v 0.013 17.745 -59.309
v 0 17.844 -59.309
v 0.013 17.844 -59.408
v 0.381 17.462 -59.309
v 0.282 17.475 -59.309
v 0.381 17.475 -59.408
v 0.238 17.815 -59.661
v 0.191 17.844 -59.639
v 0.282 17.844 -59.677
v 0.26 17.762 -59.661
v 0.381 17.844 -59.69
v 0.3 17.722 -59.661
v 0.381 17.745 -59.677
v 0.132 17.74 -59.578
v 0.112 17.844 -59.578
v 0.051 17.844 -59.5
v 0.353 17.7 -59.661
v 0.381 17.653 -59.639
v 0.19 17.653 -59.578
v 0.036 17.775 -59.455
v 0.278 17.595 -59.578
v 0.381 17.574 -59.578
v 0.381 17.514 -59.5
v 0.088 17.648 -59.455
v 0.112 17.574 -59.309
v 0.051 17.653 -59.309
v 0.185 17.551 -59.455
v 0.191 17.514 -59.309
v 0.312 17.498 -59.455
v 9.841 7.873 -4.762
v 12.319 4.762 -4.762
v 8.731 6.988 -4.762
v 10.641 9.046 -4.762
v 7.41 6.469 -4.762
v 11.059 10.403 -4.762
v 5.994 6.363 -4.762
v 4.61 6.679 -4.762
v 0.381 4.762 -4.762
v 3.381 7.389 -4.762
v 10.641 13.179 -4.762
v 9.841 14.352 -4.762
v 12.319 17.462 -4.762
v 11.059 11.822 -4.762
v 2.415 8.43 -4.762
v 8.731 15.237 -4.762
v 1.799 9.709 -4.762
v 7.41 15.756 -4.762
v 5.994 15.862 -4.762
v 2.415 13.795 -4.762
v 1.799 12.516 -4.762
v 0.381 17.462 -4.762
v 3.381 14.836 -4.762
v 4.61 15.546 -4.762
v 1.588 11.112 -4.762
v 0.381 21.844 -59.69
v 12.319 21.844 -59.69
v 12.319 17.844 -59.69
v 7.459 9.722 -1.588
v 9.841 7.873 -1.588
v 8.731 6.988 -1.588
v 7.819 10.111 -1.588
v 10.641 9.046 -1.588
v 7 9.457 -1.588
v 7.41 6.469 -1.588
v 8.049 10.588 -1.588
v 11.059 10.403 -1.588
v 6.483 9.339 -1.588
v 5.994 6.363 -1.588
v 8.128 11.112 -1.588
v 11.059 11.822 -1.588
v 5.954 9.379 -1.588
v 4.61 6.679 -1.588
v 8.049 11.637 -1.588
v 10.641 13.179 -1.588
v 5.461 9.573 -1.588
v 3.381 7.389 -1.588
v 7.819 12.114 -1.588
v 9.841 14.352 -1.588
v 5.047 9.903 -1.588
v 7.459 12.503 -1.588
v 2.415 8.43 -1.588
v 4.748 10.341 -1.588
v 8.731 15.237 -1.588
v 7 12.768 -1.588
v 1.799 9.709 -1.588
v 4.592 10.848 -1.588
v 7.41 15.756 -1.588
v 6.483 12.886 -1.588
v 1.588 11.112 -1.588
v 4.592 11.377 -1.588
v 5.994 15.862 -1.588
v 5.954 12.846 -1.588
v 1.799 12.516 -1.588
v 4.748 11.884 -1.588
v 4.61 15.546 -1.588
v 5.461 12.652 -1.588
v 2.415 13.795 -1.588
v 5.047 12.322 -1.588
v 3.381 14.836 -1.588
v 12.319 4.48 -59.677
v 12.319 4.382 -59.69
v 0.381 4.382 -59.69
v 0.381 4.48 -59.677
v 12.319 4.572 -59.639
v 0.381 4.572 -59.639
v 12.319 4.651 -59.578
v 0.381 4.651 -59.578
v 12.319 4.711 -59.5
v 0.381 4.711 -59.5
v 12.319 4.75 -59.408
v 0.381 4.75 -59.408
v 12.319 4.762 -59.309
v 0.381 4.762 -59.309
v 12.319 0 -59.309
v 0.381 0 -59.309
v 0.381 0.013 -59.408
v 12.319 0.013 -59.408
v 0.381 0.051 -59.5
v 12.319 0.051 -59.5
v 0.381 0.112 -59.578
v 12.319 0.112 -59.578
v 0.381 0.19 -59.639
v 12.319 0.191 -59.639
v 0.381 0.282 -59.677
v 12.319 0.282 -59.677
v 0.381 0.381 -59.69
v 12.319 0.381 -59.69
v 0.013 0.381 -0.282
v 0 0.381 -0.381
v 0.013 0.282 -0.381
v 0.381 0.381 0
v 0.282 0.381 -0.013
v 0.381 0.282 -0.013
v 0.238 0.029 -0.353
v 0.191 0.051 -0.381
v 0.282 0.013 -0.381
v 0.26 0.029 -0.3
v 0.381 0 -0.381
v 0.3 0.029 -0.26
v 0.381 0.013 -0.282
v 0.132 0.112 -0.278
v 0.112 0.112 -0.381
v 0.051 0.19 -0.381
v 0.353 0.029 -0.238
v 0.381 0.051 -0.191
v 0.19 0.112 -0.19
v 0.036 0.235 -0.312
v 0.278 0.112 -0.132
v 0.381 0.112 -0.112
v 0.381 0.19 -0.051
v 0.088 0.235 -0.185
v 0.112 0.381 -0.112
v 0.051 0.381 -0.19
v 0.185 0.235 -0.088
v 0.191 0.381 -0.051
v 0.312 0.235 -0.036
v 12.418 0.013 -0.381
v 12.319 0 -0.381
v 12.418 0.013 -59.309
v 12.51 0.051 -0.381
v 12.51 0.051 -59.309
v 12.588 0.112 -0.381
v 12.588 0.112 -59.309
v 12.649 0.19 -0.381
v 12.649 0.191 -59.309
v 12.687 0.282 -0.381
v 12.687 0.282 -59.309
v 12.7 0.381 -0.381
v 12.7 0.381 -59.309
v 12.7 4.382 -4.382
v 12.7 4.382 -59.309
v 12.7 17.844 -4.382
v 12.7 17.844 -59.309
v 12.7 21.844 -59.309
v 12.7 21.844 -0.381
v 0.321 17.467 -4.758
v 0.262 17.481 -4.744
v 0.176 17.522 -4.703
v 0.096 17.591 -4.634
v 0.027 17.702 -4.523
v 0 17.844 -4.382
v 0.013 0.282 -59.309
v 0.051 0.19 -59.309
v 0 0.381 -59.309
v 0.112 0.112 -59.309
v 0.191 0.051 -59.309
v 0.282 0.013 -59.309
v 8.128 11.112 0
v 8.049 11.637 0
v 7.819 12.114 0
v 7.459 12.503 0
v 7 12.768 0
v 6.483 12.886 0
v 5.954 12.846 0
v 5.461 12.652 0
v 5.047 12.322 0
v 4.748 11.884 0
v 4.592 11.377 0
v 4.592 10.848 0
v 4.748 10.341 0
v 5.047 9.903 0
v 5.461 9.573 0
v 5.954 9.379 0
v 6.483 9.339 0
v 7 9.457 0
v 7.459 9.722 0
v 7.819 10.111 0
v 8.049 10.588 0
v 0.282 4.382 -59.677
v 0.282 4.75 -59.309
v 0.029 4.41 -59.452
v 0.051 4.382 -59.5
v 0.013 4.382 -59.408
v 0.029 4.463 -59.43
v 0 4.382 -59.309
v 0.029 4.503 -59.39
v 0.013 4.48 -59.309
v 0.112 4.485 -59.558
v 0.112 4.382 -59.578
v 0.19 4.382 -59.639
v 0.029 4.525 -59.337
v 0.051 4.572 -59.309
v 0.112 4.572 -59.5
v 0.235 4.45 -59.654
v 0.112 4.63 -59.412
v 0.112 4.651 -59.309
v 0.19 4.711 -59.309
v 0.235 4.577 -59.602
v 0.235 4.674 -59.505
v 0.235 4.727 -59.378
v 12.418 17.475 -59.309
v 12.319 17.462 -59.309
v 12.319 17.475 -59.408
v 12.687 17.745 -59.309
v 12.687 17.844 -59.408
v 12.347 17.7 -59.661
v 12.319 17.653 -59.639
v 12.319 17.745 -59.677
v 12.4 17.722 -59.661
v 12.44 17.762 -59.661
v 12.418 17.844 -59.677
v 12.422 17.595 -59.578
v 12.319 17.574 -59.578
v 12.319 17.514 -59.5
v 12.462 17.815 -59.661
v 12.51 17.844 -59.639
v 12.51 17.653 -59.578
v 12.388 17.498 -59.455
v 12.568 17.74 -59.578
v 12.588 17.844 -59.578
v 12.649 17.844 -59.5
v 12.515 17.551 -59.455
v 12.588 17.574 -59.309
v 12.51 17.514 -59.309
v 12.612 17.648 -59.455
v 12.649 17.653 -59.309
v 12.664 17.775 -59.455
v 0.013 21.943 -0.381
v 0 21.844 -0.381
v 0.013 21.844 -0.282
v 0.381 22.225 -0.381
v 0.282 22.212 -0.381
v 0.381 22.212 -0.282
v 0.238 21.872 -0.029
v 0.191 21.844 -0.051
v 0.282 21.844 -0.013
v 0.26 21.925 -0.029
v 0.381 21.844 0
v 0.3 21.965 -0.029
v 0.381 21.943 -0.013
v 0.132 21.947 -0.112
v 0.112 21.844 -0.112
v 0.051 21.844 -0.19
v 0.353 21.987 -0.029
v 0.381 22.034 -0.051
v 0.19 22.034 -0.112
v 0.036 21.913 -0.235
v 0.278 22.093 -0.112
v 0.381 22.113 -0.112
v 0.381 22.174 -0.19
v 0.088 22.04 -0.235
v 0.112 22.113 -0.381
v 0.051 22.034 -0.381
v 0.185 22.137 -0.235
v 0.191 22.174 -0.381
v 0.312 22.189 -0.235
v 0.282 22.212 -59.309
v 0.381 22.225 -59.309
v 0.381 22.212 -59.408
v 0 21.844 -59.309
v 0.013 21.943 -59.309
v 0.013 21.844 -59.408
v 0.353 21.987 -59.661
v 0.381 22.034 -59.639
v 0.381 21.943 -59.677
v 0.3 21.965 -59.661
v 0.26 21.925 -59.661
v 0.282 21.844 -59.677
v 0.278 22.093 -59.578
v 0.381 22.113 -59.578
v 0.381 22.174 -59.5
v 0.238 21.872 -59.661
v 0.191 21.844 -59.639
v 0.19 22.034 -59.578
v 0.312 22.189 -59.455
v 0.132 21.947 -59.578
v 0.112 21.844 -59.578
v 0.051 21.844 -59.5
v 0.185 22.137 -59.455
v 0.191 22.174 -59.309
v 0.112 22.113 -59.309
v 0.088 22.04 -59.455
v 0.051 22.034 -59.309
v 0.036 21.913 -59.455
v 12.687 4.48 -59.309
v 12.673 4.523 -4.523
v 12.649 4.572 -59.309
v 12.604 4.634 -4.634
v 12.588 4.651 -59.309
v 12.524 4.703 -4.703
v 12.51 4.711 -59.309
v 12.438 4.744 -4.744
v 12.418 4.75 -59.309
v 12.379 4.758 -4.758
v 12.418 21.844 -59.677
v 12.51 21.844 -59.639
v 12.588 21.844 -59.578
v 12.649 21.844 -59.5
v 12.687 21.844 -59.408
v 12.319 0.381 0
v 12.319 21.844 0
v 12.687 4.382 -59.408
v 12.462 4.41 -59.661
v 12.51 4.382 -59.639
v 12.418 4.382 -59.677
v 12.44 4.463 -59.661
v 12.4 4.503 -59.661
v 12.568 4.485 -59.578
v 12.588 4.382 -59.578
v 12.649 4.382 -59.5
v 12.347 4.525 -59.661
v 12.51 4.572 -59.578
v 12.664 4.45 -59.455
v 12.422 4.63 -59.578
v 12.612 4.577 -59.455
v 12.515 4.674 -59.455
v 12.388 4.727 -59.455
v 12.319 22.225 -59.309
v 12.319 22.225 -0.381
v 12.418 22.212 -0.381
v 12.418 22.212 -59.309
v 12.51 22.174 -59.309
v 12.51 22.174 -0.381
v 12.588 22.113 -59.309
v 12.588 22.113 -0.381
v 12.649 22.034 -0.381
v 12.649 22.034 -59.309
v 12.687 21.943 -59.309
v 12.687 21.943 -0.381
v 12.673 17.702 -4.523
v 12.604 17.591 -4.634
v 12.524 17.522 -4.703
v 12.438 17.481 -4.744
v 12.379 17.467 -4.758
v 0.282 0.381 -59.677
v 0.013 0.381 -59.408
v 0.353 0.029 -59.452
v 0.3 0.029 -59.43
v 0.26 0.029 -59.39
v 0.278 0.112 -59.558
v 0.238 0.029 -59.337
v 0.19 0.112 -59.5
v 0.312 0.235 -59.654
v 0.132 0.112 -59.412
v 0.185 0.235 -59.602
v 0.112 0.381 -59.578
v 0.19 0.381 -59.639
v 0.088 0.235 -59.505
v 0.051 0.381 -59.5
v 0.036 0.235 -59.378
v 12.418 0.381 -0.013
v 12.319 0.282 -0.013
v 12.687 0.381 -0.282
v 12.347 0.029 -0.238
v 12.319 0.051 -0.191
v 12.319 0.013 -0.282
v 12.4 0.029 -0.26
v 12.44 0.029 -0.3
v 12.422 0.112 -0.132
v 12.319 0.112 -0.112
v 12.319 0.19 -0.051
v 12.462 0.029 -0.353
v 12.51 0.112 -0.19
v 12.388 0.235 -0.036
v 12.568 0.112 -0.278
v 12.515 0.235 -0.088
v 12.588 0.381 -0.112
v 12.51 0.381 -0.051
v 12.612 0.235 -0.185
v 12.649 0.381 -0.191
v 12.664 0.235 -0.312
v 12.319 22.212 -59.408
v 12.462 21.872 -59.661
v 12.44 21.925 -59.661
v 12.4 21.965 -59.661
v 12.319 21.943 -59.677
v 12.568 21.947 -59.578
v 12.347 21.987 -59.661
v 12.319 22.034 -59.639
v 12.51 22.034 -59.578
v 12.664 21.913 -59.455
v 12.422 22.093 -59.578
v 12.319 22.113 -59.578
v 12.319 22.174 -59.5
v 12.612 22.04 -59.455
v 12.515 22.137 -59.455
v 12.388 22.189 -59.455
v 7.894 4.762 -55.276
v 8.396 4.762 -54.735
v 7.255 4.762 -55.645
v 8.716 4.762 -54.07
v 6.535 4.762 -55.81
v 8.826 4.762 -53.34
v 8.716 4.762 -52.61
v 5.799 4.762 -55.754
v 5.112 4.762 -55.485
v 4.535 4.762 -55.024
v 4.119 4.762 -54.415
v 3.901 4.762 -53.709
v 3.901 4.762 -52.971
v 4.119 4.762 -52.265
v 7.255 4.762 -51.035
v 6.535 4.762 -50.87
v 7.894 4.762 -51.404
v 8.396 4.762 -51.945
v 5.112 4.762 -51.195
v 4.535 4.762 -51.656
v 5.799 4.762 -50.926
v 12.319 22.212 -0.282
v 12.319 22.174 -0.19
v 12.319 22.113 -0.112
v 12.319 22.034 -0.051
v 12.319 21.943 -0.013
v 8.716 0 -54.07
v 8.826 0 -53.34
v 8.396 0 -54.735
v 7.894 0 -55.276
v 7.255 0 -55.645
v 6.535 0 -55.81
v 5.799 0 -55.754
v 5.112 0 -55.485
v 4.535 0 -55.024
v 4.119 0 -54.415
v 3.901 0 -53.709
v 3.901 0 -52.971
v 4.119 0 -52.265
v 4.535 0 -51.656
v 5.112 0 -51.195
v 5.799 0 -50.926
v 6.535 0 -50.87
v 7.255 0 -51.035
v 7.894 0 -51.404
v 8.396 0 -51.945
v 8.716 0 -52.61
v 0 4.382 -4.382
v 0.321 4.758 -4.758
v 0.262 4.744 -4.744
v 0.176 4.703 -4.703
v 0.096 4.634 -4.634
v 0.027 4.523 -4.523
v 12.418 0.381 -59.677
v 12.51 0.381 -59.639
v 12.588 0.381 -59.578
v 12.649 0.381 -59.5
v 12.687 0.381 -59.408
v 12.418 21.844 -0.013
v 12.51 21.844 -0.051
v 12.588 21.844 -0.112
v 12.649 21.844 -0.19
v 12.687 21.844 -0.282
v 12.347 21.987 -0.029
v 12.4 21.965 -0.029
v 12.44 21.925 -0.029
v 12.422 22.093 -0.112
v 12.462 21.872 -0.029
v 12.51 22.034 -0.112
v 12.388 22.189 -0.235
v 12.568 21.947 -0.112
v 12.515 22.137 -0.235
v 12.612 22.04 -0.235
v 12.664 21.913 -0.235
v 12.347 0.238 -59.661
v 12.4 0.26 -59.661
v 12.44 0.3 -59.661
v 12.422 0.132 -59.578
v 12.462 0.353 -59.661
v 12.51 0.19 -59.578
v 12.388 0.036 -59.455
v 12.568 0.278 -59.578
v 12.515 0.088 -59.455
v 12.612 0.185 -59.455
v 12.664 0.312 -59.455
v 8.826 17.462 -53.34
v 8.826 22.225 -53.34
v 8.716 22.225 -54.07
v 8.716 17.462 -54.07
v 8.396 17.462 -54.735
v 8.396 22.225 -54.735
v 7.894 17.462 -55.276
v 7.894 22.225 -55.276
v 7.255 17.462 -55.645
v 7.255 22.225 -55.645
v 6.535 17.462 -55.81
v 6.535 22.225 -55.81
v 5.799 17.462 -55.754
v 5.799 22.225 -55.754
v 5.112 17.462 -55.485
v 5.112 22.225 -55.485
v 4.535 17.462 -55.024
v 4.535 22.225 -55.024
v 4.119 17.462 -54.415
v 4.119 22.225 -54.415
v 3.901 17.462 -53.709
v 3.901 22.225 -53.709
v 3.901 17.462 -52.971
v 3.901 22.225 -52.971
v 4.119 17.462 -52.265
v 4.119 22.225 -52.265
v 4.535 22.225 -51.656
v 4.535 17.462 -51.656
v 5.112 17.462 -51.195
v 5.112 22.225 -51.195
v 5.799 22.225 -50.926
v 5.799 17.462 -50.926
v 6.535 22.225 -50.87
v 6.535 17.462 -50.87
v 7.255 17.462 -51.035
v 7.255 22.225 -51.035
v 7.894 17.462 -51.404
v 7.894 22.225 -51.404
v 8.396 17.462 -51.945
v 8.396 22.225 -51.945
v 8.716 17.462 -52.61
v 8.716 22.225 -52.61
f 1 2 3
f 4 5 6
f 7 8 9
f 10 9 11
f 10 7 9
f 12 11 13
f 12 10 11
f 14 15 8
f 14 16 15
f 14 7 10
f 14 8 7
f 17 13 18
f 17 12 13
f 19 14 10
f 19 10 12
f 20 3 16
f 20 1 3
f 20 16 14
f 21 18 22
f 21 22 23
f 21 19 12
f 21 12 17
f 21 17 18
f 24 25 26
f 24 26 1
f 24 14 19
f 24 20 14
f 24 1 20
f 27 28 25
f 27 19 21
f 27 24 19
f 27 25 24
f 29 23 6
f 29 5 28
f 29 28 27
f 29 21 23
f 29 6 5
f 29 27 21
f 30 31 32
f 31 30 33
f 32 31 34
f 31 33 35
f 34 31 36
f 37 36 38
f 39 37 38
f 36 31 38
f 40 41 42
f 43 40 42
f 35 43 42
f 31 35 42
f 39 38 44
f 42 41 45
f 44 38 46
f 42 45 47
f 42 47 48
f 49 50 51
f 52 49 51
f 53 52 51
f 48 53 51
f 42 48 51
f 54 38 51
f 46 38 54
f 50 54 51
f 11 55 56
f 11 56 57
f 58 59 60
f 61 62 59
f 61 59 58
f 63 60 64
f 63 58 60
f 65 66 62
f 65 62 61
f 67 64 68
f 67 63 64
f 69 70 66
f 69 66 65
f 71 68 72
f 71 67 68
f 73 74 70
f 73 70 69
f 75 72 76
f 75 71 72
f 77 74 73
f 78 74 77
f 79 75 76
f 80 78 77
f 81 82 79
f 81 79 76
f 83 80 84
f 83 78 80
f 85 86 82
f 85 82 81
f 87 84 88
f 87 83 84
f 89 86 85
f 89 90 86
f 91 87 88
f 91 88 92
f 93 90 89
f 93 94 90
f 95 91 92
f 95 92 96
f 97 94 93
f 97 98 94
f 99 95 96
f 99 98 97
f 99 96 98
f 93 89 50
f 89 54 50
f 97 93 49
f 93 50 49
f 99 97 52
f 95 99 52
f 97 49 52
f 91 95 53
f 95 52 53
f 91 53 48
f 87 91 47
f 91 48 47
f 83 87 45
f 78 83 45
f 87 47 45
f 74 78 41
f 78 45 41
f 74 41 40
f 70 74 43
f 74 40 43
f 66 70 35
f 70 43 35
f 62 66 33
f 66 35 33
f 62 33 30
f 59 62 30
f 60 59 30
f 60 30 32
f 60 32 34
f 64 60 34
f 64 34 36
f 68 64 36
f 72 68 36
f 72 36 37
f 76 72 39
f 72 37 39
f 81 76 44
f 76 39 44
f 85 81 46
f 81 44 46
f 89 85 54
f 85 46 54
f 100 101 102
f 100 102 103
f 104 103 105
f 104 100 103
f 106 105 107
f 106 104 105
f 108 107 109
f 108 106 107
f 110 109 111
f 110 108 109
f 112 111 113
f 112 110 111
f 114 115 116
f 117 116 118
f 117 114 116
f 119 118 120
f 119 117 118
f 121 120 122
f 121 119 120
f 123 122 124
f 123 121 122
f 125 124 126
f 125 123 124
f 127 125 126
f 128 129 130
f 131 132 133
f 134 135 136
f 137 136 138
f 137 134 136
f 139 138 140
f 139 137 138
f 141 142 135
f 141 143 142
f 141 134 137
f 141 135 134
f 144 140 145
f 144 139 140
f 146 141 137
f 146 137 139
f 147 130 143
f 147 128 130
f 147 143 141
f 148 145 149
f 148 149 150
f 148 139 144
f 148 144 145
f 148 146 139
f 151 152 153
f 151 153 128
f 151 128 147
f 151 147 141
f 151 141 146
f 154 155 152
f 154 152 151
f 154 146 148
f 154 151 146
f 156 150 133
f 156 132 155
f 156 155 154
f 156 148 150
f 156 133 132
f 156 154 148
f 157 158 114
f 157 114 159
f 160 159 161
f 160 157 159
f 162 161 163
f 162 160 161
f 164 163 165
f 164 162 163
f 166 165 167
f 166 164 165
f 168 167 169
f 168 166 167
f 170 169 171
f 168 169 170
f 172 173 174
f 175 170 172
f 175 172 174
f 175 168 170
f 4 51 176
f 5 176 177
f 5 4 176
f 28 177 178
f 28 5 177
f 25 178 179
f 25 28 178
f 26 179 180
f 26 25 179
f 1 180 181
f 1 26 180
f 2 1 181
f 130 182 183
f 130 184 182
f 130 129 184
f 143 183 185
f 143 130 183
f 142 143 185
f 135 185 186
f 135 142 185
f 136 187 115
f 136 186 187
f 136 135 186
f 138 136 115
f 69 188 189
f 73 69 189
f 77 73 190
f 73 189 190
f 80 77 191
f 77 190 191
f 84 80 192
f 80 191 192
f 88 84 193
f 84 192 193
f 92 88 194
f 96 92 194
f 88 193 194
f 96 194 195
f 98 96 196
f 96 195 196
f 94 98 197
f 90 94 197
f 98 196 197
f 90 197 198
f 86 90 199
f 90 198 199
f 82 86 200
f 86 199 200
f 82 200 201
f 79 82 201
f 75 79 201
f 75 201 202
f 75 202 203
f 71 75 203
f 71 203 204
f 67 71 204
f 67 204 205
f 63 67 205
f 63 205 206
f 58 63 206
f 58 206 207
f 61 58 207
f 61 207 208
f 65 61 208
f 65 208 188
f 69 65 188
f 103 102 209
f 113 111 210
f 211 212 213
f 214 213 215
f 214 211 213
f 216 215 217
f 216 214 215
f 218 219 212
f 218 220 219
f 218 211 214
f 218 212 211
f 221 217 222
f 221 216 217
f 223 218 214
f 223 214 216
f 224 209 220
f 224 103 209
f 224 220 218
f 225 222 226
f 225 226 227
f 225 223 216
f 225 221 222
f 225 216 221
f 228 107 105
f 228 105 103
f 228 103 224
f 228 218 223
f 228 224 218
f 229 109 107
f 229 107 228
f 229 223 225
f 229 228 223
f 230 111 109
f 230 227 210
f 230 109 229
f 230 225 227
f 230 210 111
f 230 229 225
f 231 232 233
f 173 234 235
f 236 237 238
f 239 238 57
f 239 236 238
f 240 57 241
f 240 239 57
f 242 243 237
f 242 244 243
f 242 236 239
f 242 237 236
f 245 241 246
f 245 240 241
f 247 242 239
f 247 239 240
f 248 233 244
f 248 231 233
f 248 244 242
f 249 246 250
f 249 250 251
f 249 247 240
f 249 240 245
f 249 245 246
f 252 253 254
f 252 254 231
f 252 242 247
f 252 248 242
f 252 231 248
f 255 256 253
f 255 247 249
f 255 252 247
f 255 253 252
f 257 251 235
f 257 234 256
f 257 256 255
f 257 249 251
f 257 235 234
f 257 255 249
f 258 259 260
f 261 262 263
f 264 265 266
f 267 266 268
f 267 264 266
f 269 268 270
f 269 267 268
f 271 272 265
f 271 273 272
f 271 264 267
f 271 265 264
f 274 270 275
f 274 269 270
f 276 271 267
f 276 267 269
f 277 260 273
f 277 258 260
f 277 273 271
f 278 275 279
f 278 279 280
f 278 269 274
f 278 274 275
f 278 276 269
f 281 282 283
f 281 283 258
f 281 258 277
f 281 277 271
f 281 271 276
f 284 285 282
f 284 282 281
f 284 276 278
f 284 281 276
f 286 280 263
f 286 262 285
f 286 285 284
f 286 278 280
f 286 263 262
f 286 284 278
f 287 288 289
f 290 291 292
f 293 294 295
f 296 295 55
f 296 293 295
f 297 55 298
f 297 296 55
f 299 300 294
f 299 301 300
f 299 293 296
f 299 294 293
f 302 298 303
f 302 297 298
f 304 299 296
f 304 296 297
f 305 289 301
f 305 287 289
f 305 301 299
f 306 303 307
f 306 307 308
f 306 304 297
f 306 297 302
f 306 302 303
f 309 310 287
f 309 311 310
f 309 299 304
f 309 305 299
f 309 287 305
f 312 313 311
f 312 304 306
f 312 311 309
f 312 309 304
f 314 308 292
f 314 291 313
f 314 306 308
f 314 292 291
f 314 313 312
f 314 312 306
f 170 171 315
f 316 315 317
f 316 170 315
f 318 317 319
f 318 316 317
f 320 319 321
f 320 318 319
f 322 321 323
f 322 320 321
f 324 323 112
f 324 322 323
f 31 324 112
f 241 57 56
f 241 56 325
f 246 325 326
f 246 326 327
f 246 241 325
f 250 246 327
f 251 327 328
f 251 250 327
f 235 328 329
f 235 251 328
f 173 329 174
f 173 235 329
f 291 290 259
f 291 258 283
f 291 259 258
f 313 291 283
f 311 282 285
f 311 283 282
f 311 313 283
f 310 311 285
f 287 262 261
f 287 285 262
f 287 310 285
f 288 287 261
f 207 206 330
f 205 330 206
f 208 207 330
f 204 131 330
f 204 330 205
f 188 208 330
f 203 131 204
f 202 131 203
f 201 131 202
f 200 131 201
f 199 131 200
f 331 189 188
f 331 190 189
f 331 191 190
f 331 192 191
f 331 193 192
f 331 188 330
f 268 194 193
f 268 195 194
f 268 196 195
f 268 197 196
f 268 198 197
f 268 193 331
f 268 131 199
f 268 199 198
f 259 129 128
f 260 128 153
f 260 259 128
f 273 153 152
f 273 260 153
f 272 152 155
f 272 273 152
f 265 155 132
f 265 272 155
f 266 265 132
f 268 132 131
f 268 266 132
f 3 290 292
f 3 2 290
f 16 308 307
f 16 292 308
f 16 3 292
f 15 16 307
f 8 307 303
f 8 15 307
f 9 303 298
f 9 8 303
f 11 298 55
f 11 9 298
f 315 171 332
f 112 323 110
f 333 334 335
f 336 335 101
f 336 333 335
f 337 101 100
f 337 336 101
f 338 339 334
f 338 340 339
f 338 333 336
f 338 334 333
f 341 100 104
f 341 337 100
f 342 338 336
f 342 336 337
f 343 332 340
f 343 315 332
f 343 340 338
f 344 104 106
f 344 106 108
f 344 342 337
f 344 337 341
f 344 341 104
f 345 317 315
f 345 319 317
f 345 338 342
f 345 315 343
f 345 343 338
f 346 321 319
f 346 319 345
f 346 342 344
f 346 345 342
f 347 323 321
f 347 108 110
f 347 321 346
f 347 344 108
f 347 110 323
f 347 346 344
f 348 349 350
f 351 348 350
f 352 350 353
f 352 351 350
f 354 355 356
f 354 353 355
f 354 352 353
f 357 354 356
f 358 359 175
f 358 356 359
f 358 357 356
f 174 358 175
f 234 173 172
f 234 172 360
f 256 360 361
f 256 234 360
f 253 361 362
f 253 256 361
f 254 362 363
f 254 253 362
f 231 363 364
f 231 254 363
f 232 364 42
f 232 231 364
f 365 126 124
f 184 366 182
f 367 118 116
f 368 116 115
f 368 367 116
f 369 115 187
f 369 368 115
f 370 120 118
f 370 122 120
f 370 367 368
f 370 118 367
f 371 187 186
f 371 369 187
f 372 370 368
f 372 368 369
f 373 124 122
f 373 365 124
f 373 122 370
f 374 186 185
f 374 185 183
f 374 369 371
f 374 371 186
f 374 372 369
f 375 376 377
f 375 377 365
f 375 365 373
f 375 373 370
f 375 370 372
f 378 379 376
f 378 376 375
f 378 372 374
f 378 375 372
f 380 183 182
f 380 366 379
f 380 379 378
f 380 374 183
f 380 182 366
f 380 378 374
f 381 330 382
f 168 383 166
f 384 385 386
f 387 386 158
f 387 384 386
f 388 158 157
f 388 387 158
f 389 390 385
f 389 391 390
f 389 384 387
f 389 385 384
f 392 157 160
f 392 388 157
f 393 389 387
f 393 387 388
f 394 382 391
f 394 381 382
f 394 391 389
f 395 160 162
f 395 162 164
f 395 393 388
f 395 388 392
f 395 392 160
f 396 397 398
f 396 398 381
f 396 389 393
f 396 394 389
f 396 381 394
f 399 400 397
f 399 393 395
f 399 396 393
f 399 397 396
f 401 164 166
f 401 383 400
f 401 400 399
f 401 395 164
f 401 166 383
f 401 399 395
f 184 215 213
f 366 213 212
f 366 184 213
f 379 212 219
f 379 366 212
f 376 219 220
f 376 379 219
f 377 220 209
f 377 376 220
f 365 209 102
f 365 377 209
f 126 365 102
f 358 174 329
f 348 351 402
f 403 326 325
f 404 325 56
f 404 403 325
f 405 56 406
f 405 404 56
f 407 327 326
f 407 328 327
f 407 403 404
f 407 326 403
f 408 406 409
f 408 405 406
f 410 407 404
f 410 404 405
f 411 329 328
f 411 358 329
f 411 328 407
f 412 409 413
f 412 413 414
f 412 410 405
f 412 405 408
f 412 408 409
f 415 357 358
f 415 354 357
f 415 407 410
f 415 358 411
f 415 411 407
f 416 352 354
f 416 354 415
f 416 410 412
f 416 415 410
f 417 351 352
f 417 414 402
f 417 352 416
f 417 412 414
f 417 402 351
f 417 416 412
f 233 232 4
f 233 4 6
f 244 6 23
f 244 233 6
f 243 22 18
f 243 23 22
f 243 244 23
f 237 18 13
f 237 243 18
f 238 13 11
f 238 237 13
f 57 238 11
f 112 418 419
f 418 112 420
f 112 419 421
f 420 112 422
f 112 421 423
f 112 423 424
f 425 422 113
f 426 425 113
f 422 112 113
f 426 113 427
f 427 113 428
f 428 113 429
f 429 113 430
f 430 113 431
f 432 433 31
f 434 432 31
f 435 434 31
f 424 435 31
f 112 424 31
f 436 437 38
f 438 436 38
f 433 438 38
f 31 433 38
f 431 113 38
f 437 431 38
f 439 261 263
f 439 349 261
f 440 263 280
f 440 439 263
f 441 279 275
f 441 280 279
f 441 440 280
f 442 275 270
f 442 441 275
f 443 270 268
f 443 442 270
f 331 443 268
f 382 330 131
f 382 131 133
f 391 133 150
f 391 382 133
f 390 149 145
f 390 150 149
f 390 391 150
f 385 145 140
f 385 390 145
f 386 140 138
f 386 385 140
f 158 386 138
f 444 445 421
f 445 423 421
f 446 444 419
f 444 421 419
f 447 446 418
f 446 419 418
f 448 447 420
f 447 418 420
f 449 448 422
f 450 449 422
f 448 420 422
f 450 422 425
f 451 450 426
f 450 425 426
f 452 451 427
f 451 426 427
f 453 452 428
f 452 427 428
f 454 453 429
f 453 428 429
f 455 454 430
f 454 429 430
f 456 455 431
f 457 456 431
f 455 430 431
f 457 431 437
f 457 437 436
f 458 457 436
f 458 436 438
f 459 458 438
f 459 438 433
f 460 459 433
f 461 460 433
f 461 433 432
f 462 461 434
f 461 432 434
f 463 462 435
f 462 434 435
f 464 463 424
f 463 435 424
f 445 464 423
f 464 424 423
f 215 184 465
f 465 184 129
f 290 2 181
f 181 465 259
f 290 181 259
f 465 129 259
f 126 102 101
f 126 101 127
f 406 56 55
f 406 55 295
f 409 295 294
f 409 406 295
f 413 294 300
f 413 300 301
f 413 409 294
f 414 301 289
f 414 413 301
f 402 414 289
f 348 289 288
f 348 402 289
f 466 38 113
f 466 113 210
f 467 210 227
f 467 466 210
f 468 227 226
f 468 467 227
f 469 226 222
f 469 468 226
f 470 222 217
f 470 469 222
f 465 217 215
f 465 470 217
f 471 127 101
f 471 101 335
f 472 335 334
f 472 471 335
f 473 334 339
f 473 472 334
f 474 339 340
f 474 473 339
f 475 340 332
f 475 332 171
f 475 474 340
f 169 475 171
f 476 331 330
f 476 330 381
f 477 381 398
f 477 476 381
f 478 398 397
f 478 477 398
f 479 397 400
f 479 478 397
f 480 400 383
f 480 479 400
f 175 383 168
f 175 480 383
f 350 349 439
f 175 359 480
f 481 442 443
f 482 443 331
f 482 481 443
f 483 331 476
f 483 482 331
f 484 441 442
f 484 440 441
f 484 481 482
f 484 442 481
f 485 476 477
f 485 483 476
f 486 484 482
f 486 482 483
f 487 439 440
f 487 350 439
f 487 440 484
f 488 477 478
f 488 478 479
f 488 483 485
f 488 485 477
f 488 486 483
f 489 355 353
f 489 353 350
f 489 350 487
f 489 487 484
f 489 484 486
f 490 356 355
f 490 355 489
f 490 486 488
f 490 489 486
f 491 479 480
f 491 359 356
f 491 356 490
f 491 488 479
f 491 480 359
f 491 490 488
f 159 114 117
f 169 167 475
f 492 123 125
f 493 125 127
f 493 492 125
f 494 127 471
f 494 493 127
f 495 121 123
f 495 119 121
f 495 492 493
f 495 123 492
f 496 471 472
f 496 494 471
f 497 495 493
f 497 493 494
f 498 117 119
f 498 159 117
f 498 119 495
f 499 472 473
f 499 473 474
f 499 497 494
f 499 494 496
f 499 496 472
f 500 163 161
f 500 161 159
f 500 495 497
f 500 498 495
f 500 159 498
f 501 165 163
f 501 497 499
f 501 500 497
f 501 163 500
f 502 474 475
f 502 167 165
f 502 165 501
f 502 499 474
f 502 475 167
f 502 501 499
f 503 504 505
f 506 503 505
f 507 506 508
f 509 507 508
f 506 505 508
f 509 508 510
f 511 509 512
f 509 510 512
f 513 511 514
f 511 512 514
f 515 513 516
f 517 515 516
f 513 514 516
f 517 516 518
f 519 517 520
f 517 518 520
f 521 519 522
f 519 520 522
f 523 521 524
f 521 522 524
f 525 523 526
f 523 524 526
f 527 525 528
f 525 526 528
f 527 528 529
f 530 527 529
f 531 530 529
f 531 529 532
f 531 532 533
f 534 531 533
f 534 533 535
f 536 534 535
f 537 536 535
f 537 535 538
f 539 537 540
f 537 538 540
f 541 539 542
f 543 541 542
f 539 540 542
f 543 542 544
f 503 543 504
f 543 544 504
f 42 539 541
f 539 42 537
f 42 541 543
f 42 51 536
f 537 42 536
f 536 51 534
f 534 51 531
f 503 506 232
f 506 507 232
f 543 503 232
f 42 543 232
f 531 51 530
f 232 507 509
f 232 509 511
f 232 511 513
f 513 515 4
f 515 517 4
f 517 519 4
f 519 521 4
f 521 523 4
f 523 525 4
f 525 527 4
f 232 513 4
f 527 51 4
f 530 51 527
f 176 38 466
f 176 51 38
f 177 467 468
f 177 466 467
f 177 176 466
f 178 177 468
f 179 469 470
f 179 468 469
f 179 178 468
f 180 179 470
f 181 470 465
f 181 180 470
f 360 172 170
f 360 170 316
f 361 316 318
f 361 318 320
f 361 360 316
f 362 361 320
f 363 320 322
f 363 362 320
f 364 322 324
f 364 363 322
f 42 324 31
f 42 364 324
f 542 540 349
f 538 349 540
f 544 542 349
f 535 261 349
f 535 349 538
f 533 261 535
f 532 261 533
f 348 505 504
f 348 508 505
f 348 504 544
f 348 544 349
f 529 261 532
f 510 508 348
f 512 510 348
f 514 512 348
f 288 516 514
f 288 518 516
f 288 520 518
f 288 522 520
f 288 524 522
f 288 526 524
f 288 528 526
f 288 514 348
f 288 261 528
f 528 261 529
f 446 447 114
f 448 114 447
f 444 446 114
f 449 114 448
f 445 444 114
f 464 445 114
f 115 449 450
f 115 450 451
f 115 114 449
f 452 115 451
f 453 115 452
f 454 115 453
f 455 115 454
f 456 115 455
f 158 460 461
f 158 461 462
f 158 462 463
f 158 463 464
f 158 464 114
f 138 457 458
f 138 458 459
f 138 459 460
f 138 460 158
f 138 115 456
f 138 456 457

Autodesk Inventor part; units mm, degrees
ref_plane "YZ Plane" through (0, 0, 0) normal (1, 0, 0) x (0, 1, 0)
ref_plane "XZ Plane" through (0, 0, 0) normal (0, 1, 0) x (-1, 0, 0)
ref_plane "XY Plane" through (0, 0, 0) normal (0, 0, 1) x (1, 0, 0)
sketch "Sketch1" plane through (0, 0, 0) normal (1, 0, 0) x (0, 1, 0)
  line L0 (0, 0) -> (22.225, 0)
  line L1 (22.225, 0) -> (22.225, -59.69)
  line L2 (0, -59.69) -> (0, 0)
  line L3 (4.7625, -59.69) -> (5.9323, -59.69)
  line L4 (4.7625, -59.69) -> (4.7625, -4.7625)
  line L5 (4.7625, -4.7625) -> (17.4625, -4.7625)
  line L6 (17.4625, -4.7625) -> (17.4625, -59.69)
  line L7 (22.225, -59.69) -> (17.4625, -59.69)
  line L8 (4.7625, -59.69) -> (0, -59.69)
  dimension "d1" = 59.69
  dimension "d4" = 12.7
  dimension "d6" = 4.7625
  dimension "d15" = 59.69
  dimension "d22" = 4.7625
  dimension "d24" = 4.7625
extrude "Extrusion1" add sketch "Sketch1" along normal blind 12.7
sketch "Sketch2" plane through (0, 22.225, 0) normal (0, 1, 0) x (1, 0, 0)
  circle A0 centre (6.35, 53.34) radius 2.4765
  line L0 (0, 0) -> (0, 59.69) projected
  line L1 (0, 0) -> (12.7, 0) projected
  line L2 (12.7, 59.69) -> (12.7, 0) projected
  line L3 (0, 59.69) -> (12.7, 59.69) projected
  point P0 (0, 0)
  dimension "d9" = 4.953
  dimension "d10" = 12.7
  dimension "d11" = 6.35
  dimension "d16" = 6.35
extrude "Extrusion2" cut sketch "Sketch2" against normal blind 25.4 contours A0
sketch "Sketch3" plane through (0, 4.7625, -4.7625) normal (0, 0, -1) x (-1, 0, 0)
  line L0 (0, 12.7) -> (0, 0) projected
  line L1 (0, 12.7) -> (-12.7, 12.7) projected
  line L2 (-12.7, 0) -> (-12.7, 12.7) projected
  line L3 (0, 0) -> (-12.7, 0) projected
  line L4 (0, 0) -> (-12.7, 0) projected
  line L5 (0, 0) -> (0, -4.7625) projected
  line L6 (0, 0) -> (-12.7, 0) projected
  line L7 (-12.7, -4.7625) -> (-12.7, 0) projected
  line L8 (0, -4.7625) -> (-12.7, -4.7625) projected
  circle A0 centre (-6.35, 6.35) radius 4.7625
  point P0 (0, -4.7625)
  dimension "d17" = 9.525
  dimension "d18" = 6.35
  dimension "d19" = 6.35
  dimension "d23" = 12.7
extrude "Extrusion3" cut sketch "Sketch3" against normal blind 3.175 contours A0
sketch "Sketch4" plane through (0, 0, 0) normal (0, 0, 1) x (1, 0, 0)
  line L0 (0, 0) -> (0, 22.225) projected
  line L1 (0, 0) -> (12.7, 0) projected
  line L2 (12.7, 22.225) -> (12.7, 0) projected
  line L3 (0, 22.225) -> (12.7, 22.225) projected
  circle A0 centre (6.35, 11.1125) radius 1.778
  dimension "d25" = 3.556
extrude "Extrusion4" cut sketch "Sketch4" against normal blind 25.4 contours A0
fillet "Fillet2" radius 0.381 22 edges at (12.7, 22.225, -29.845) (12.7, 17.4625, -32.2263) (0, 22.225, -29.845) (12.7, 11.1125, 0) (12.7, 11.1125, -4.7625) (12.7, 4.7625, -32.2263) (12.7, 0, -29.845) (12.7, 19.8438, -59.69) (12.7, 2.3813, -59.69) (6.35, 22.225, 0) (0, 11.1125, 0) (6.35, 0, 0) (6.35, 22.225, -59.69) (6.35, 4.7625, -59.69) (0, 17.4625, -32.2263) (0, 11.1125, -4.7625) (0, 4.7625, -32.2263) (6.35, 17.4625, -59.69) (0, 19.8438, -59.69) (0, 2.3813, -59.69) (0, 0, -29.845) (6.35, 0, -59.69)
equation "\"d15\" = d1"
equation "\"d11\" = 0.5 * d10"
equation "\"d16\" = d11"
equation "\"d18\" = 0.5 * d23"
properties part number "TensionerAxleHolder"
